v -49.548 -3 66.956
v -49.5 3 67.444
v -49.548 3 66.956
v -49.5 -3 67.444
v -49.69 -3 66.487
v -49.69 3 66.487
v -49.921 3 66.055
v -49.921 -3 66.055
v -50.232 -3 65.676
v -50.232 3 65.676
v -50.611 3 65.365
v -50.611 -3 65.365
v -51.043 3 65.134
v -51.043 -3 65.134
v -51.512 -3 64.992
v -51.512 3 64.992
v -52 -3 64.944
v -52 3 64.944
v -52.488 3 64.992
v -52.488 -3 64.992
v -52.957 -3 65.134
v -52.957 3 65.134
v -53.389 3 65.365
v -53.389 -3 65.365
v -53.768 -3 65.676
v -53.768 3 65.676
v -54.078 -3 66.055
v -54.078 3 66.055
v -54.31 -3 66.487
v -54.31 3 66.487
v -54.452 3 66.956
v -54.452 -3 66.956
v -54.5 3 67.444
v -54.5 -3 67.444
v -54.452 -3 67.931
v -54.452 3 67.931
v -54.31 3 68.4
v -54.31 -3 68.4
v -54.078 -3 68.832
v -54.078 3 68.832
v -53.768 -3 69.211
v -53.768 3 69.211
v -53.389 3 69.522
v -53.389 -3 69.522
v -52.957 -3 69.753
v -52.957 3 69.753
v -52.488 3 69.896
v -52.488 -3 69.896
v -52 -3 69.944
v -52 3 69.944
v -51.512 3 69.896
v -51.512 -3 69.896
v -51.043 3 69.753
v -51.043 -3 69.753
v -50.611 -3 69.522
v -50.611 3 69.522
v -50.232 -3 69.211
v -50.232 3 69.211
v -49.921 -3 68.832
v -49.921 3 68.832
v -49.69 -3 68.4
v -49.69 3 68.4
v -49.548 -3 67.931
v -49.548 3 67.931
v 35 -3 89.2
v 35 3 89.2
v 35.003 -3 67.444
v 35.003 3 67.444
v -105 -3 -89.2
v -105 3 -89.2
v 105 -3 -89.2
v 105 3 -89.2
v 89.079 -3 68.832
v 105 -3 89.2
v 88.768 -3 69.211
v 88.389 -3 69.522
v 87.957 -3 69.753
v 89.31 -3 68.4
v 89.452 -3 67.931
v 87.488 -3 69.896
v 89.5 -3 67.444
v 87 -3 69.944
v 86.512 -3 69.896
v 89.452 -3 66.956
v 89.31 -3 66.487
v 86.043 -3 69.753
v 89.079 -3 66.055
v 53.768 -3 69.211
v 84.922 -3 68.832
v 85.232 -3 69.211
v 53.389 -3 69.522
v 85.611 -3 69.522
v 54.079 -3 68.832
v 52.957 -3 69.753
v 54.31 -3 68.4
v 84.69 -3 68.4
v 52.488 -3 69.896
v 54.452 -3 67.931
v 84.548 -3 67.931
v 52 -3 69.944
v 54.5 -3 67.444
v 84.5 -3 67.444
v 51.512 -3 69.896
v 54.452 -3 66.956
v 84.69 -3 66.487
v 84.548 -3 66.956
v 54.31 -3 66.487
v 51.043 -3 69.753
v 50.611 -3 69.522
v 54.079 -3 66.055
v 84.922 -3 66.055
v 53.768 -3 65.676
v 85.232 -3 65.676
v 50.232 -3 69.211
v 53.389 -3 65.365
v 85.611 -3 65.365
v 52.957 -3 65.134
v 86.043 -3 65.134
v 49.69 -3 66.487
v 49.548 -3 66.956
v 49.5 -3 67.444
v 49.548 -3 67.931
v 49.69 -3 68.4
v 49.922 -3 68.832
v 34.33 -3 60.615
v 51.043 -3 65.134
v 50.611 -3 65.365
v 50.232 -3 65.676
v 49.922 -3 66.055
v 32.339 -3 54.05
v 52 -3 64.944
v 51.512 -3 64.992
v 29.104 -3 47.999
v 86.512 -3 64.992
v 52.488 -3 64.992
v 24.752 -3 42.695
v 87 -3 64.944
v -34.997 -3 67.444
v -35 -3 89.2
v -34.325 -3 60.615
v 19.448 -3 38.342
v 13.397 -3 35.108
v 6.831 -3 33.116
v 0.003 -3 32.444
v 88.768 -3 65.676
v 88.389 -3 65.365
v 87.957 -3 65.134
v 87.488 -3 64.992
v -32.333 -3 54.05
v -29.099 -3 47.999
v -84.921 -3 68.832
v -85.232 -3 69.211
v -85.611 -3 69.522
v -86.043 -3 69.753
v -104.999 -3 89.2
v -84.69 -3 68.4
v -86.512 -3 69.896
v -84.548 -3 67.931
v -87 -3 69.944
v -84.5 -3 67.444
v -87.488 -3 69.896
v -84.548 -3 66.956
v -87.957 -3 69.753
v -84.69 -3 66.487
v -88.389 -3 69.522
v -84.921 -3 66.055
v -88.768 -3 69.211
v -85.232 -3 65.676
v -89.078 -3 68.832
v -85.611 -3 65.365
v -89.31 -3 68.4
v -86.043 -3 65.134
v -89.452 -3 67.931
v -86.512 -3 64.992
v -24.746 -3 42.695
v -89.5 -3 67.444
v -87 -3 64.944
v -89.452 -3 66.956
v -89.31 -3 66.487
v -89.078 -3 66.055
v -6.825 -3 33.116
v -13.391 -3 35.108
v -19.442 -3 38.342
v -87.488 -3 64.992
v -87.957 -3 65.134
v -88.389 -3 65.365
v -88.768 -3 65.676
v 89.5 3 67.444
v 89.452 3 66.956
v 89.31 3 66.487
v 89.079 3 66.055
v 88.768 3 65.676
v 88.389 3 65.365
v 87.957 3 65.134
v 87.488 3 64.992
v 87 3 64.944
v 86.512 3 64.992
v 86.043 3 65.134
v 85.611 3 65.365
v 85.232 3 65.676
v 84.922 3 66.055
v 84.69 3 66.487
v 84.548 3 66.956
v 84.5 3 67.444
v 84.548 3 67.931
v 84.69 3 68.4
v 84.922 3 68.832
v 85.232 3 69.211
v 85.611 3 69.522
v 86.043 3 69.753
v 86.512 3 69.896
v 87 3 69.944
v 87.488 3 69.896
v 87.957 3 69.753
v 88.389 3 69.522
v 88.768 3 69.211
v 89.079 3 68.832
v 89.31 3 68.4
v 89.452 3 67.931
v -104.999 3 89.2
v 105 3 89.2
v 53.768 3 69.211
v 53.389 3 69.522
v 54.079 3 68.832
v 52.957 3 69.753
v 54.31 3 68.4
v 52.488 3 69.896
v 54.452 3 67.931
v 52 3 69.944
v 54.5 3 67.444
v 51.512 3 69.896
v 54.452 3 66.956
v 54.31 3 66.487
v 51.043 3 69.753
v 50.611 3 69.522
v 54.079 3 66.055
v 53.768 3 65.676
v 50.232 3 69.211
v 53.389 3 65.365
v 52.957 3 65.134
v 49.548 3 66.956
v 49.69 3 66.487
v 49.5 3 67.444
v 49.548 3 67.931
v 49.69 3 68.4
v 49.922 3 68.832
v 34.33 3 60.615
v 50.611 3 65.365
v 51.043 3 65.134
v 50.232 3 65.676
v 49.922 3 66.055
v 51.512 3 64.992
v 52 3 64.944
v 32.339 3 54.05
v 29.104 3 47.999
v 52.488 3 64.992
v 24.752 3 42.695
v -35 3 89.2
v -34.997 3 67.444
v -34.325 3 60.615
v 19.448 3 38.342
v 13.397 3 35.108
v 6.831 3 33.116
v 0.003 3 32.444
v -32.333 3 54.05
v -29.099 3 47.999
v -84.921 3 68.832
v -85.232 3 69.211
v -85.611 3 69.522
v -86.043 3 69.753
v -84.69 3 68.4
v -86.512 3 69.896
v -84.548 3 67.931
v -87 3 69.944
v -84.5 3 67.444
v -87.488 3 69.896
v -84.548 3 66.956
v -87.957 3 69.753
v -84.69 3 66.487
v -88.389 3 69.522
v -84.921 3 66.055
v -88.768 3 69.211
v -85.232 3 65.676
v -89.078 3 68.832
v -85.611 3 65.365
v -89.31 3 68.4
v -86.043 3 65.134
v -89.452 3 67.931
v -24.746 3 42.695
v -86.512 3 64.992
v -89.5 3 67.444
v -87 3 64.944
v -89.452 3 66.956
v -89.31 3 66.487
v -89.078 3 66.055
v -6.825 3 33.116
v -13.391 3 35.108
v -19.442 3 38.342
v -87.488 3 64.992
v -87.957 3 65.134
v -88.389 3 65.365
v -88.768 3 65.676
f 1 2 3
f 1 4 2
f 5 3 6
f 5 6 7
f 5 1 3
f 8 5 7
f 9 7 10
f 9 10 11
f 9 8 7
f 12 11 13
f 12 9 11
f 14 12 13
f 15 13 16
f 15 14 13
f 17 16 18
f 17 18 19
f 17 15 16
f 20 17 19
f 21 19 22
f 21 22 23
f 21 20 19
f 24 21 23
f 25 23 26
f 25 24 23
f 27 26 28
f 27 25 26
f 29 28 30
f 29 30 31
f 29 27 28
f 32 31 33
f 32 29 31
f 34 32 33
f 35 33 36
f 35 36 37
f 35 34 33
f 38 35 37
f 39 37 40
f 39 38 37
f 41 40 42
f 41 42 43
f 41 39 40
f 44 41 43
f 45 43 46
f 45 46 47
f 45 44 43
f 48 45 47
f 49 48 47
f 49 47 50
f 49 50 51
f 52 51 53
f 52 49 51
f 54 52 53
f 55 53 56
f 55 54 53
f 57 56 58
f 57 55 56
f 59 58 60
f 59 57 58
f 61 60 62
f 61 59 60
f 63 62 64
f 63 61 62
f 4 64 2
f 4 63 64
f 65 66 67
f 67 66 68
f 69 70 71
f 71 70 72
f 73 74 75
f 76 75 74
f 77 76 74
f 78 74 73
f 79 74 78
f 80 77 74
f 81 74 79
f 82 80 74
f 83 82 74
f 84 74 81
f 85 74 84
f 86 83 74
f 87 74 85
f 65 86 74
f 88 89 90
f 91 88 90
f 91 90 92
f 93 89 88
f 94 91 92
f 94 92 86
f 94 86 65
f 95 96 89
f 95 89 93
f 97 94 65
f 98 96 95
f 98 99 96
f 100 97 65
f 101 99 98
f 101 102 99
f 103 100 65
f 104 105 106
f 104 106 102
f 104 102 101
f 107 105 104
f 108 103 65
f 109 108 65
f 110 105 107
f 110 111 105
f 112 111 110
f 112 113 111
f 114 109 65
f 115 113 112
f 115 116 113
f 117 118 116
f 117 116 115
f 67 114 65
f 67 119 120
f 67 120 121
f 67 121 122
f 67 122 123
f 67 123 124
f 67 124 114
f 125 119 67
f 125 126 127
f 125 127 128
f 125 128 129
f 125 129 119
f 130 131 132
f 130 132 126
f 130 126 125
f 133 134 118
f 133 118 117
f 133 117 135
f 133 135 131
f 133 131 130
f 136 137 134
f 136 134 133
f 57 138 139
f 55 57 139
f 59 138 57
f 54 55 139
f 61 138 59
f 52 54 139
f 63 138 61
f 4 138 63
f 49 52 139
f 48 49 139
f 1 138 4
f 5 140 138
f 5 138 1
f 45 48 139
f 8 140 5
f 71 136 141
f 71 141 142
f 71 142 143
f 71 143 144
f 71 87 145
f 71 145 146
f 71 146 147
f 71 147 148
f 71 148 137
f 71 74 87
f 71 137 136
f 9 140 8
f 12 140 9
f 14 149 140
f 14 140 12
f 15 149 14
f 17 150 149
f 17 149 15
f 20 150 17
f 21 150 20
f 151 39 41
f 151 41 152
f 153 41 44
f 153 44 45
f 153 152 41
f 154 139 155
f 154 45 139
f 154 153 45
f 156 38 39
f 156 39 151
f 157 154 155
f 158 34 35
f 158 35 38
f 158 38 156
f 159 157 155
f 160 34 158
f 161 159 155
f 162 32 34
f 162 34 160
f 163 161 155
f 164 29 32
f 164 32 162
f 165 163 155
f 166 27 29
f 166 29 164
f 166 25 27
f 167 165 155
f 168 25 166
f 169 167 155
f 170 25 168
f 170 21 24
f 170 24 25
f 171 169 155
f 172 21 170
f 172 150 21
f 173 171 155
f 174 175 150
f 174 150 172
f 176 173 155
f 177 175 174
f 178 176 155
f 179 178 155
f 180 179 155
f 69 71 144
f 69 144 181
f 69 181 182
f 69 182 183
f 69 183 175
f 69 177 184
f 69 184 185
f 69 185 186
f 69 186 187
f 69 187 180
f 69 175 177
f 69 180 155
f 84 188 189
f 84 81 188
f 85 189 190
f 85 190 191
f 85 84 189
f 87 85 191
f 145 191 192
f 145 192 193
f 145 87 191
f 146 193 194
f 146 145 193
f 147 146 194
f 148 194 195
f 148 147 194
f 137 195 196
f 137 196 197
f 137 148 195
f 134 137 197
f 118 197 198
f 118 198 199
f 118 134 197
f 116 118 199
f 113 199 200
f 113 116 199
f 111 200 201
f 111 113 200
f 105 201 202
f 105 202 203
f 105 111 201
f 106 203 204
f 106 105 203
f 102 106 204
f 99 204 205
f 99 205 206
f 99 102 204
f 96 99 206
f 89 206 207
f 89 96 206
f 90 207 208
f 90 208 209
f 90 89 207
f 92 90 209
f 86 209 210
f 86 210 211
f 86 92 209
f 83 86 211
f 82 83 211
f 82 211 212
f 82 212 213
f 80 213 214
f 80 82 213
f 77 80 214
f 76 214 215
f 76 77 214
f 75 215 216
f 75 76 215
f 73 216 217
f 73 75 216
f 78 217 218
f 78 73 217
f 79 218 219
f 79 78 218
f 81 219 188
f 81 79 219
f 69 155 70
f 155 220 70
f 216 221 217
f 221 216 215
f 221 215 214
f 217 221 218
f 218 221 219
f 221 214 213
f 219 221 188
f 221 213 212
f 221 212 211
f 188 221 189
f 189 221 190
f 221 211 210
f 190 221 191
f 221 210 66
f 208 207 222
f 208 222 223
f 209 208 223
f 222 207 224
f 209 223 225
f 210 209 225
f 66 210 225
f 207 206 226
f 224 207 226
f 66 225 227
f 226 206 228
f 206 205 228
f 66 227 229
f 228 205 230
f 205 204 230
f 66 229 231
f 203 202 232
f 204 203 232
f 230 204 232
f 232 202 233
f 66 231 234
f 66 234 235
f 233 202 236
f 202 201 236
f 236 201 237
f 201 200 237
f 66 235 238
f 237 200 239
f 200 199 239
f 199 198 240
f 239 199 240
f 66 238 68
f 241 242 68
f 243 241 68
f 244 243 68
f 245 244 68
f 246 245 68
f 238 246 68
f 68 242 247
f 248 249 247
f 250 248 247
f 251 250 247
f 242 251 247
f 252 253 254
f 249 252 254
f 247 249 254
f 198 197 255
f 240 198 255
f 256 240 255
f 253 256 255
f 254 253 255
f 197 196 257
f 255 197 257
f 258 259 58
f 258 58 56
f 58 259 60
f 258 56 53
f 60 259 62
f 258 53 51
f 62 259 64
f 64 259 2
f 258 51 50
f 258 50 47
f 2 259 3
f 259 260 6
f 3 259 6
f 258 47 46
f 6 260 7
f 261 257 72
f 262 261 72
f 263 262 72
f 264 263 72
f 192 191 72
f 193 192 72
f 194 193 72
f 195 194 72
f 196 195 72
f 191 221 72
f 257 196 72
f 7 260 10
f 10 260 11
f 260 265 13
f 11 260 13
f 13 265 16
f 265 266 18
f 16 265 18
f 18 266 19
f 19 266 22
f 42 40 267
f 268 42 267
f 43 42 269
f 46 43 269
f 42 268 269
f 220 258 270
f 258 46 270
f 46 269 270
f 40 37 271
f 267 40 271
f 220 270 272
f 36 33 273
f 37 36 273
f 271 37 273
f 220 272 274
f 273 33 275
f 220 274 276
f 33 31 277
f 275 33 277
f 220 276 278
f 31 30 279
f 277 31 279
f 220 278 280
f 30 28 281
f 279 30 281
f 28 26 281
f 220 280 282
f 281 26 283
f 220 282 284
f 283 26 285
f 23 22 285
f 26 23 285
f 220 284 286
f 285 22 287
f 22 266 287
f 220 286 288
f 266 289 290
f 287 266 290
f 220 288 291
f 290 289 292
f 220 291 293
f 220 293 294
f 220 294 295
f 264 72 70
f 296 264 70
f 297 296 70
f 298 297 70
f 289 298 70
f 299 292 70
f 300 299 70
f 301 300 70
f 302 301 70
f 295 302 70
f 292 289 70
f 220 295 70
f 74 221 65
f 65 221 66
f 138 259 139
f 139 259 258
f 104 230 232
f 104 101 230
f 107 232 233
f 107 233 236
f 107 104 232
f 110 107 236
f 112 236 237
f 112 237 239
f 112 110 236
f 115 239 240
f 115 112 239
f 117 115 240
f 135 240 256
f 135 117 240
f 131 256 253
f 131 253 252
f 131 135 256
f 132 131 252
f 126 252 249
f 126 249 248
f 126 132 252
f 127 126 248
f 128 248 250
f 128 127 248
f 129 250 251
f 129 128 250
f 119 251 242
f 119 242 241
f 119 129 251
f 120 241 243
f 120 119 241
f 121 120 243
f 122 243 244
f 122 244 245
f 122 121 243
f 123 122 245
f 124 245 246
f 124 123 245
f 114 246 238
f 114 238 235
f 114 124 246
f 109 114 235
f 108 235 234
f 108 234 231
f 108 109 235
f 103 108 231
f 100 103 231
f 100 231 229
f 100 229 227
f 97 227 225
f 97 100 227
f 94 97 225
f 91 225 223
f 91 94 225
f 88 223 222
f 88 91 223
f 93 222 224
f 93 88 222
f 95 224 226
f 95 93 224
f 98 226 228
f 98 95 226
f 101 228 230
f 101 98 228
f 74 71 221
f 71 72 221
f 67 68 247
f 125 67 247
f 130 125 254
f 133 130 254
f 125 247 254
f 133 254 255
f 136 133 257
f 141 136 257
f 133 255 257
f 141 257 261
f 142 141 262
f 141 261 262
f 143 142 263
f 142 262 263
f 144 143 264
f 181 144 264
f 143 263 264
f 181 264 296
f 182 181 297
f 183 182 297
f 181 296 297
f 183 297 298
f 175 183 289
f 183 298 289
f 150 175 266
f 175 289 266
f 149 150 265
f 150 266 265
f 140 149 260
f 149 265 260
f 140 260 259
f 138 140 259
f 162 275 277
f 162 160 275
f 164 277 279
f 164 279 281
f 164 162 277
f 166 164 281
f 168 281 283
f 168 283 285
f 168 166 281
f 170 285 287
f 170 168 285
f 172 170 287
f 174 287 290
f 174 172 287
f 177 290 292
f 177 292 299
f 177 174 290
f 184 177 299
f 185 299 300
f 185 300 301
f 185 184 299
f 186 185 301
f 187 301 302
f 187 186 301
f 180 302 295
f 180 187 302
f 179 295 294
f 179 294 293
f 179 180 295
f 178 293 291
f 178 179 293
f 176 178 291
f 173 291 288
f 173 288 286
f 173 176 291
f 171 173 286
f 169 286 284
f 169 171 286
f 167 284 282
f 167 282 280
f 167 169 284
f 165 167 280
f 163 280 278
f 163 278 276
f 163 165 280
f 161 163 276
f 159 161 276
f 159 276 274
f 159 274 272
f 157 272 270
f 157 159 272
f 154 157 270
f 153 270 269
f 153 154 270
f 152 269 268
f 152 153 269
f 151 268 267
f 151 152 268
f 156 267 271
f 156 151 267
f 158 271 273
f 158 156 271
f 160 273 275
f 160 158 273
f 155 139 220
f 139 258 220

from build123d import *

# Parameters (mm, degrees)
MODEL_R             = 2.5
BOSS_EXTRUDE1_DEPTH = 3


with BuildPart() as part:
    # Model → Boss-Extrude1 (new body, symmetric)
    with BuildSketch(Plane(origin=(0, 0, 0), x_dir=(1, 0, 0), z_dir=(0, 1, 0))):
        with BuildLine():
            Line((-34.997168674, -67.443546623), (-34.999805804, -89.200353377))
            Line((-34.999805804, -89.200353377), (-104.999287788, -89.200353377))
            Line((-104.999287788, -89.200353377), (-105.000194196, 89.200353377))
            Line((-105.000194196, 89.200353377), (104.999740995, 89.200353377))
            Line((104.999740995, 89.200353377), (104.999740995, -89.200353377))
            Line((104.999740995, -89.200353377), (35.000194196, -89.200353377))
            Line((35.000194196, -89.200353377), (35.002831326, -67.443546623))
            ThreePointArc((35.002831326, -67.443546623), (0.002831326, -32.443546623), (-34.997168674, -67.443546623))
        make_face()
        with Locations((52.000194196, -67.443546623)):
            Circle(MODEL_R, mode=Mode.SUBTRACT)
        with Locations((-51.999805804, -67.443546623)):
            Circle(MODEL_R, mode=Mode.SUBTRACT)
        with Locations((-86.999805804, -67.443546623)):
            Circle(MODEL_R, mode=Mode.SUBTRACT)
        with Locations((87.000194196, -67.443546623)):
            Circle(MODEL_R, mode=Mode.SUBTRACT)
    extrude(amount=BOSS_EXTRUDE1_DEPTH, both=True)


solid = part.part
